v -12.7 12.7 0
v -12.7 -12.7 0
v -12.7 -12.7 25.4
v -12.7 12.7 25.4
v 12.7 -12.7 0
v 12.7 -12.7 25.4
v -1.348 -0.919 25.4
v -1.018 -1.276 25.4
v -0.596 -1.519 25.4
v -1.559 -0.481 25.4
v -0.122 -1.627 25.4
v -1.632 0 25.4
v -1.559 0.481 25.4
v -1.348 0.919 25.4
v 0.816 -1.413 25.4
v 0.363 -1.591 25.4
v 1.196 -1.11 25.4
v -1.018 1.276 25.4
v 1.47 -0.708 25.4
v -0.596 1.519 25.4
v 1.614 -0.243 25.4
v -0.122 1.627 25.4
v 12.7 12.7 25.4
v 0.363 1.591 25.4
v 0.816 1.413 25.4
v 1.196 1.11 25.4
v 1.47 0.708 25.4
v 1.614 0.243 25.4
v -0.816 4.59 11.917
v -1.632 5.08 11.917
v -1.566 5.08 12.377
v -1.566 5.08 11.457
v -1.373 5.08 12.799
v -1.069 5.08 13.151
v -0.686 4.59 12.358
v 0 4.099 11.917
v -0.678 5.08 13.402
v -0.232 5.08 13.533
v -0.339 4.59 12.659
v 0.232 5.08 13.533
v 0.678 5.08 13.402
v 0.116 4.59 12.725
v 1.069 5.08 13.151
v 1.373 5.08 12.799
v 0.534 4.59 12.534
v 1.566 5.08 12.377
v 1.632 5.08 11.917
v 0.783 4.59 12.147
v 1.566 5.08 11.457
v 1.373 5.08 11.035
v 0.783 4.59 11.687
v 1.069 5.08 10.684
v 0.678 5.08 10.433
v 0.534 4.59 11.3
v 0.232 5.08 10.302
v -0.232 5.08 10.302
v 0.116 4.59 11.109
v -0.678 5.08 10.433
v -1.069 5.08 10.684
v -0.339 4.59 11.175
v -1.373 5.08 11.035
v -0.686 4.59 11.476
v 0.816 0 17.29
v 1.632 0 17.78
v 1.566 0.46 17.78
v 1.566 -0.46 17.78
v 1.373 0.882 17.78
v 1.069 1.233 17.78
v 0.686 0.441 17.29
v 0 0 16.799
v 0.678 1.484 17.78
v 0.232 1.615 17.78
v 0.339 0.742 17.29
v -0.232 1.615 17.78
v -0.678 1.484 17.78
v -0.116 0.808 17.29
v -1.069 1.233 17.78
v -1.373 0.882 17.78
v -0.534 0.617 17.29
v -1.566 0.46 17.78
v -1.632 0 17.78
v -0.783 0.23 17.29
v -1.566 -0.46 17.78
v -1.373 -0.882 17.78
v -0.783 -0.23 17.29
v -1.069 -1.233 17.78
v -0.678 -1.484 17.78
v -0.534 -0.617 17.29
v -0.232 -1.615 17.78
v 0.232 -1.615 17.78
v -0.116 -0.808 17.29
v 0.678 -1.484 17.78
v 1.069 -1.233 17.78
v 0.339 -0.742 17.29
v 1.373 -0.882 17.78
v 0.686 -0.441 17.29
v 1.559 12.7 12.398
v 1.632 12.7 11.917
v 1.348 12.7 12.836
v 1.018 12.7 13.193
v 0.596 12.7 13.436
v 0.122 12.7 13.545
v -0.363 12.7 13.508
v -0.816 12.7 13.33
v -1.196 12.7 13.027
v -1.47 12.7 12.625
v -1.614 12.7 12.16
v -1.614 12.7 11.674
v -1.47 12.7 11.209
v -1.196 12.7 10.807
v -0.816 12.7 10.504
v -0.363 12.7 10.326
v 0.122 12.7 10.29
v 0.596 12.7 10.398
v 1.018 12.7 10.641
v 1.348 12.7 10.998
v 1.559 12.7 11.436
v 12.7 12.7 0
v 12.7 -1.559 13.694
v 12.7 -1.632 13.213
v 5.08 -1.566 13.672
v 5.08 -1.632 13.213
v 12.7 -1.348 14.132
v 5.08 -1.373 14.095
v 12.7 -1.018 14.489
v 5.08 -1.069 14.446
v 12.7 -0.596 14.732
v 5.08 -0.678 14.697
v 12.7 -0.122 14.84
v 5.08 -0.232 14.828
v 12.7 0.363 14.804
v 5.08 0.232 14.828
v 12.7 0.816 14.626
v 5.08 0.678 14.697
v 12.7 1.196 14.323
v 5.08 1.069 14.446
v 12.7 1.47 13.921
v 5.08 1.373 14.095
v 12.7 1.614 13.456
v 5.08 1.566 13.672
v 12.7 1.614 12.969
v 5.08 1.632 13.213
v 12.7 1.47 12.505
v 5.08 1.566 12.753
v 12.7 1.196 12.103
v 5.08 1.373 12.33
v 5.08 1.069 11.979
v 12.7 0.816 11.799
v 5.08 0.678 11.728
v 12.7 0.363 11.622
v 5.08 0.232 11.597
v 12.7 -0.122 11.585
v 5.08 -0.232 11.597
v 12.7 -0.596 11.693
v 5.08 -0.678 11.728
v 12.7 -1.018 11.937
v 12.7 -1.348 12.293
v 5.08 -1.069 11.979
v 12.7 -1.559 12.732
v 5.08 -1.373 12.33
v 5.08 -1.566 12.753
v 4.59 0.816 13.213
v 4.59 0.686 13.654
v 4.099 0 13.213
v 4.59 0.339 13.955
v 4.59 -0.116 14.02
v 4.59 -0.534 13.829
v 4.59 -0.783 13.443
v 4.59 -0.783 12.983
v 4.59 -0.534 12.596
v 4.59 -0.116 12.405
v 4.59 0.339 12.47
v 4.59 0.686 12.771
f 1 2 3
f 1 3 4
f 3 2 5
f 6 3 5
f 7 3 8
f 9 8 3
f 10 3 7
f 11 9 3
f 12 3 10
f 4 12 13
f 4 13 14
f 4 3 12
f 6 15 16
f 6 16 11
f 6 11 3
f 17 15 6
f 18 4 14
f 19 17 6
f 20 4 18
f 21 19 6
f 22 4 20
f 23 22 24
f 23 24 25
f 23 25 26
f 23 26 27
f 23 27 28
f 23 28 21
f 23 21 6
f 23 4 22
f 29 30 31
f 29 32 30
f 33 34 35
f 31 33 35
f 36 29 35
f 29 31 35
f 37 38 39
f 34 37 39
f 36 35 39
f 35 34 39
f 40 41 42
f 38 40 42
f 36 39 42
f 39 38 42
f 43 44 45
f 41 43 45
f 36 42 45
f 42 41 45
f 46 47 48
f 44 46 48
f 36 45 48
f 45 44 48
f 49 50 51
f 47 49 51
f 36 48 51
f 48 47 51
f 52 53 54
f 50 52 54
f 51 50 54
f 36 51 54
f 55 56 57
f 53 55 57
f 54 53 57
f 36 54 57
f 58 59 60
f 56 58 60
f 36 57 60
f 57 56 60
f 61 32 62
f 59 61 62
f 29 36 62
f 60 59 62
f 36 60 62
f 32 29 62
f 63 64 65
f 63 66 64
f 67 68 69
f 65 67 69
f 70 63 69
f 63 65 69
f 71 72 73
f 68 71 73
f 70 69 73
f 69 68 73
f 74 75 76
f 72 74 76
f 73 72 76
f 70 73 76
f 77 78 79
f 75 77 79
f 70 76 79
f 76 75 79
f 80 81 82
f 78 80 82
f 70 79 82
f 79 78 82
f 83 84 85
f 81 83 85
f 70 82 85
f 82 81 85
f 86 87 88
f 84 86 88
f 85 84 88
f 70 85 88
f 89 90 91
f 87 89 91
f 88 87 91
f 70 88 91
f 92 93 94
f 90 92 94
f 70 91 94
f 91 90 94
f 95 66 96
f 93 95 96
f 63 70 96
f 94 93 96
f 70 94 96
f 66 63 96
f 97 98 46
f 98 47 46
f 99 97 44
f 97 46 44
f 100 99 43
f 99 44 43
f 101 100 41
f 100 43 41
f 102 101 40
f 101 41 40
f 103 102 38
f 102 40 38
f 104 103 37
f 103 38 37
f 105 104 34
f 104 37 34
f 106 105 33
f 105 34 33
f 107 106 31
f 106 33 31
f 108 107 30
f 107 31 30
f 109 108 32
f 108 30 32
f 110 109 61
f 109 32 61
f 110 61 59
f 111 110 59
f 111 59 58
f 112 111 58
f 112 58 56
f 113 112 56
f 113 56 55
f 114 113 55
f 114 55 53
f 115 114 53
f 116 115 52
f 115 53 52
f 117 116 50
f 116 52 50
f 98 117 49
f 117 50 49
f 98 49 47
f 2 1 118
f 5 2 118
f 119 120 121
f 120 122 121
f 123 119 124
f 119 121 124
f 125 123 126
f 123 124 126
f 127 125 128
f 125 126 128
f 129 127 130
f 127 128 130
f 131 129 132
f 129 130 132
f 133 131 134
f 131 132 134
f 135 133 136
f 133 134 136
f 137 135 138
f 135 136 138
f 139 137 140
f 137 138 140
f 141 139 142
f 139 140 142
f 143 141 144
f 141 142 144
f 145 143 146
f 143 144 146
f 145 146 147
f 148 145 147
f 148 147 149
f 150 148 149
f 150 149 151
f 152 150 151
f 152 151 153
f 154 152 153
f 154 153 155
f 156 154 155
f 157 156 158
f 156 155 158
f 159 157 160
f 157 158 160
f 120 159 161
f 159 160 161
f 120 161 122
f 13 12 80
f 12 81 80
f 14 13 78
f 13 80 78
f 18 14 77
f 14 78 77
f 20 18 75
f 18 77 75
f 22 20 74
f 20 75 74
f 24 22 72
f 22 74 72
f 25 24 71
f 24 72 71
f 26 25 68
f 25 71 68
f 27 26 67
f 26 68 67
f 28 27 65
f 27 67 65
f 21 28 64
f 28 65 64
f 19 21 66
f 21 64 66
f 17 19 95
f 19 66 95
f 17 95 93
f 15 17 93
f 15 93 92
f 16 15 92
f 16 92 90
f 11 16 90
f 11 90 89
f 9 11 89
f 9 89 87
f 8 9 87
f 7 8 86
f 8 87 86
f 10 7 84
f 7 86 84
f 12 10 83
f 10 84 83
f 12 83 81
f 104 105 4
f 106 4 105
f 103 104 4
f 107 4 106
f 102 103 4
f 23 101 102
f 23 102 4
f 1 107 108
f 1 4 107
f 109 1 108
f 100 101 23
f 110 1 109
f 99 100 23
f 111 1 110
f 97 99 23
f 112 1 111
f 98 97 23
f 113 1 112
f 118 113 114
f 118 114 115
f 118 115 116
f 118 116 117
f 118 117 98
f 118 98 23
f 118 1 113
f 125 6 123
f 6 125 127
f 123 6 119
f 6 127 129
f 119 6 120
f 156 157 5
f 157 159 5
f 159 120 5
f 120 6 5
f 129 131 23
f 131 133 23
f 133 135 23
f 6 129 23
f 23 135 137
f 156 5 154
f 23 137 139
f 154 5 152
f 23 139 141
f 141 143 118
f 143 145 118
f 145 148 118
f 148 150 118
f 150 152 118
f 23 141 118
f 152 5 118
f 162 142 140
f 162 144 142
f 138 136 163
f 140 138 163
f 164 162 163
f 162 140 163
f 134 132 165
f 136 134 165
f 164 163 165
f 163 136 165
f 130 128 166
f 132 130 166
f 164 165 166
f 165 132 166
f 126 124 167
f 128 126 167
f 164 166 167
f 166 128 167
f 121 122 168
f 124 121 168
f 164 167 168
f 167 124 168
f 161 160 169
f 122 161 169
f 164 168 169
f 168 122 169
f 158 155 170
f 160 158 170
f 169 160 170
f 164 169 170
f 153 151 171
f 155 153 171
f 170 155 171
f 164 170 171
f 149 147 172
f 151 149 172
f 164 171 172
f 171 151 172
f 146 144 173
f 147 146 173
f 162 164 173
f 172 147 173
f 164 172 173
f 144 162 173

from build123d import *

# Parameters (mm, degrees)
F0_W     = 25.4
F0_H     = 25.4
F1_DEPTH = 25.4
F5_D     = 3.2639
F5_DEPTH = 7.62
F5_TIP   = 0.9805744872
F6_D     = 3.2639
F6_DEPTH = 7.62
F6_TIP   = 0.9805744872
F7_D     = 3.2639
F7_DEPTH = 7.62
F7_TIP   = 0.9805744872


with BuildPart() as f1:
    # F0 (on Top) → F1 (new body)
    with BuildSketch(Plane.XY):
        Rectangle(F0_W, F0_H)
    extrude(amount=F1_DEPTH)

    # F5
    with Locations(Plane.XY.offset(25.4)):
        with Locations((0, 0)):
            Hole(F5_D / 2, depth=F5_DEPTH)
            with Locations((0, 0, -(F5_DEPTH + F5_TIP / 2))):  # 118° drill point
                Cone(0, F5_D / 2, F5_TIP, mode=Mode.SUBTRACT)

    # F6
    with Locations(Plane.YZ.offset(12.7)):
        with Locations((0, 13.2126277313)):
            Hole(F6_D / 2, depth=F6_DEPTH)
            with Locations((0, 0, -(F6_DEPTH + F6_TIP / 2))):  # 118° drill point
                Cone(0, F6_D / 2, F6_TIP, mode=Mode.SUBTRACT)

    # F7
    with Locations(Plane(origin=(0, 12.7, 0), x_dir=(-1, 0, 0), z_dir=(0, 1, 0))):
        with Locations((0, 11.9171617553)):
            Hole(F7_D / 2, depth=F7_DEPTH)
            with Locations((0, 0, -(F7_DEPTH + F7_TIP / 2))):  # 118° drill point
                Cone(0, F7_D / 2, F7_TIP, mode=Mode.SUBTRACT)


solid = f1.part
